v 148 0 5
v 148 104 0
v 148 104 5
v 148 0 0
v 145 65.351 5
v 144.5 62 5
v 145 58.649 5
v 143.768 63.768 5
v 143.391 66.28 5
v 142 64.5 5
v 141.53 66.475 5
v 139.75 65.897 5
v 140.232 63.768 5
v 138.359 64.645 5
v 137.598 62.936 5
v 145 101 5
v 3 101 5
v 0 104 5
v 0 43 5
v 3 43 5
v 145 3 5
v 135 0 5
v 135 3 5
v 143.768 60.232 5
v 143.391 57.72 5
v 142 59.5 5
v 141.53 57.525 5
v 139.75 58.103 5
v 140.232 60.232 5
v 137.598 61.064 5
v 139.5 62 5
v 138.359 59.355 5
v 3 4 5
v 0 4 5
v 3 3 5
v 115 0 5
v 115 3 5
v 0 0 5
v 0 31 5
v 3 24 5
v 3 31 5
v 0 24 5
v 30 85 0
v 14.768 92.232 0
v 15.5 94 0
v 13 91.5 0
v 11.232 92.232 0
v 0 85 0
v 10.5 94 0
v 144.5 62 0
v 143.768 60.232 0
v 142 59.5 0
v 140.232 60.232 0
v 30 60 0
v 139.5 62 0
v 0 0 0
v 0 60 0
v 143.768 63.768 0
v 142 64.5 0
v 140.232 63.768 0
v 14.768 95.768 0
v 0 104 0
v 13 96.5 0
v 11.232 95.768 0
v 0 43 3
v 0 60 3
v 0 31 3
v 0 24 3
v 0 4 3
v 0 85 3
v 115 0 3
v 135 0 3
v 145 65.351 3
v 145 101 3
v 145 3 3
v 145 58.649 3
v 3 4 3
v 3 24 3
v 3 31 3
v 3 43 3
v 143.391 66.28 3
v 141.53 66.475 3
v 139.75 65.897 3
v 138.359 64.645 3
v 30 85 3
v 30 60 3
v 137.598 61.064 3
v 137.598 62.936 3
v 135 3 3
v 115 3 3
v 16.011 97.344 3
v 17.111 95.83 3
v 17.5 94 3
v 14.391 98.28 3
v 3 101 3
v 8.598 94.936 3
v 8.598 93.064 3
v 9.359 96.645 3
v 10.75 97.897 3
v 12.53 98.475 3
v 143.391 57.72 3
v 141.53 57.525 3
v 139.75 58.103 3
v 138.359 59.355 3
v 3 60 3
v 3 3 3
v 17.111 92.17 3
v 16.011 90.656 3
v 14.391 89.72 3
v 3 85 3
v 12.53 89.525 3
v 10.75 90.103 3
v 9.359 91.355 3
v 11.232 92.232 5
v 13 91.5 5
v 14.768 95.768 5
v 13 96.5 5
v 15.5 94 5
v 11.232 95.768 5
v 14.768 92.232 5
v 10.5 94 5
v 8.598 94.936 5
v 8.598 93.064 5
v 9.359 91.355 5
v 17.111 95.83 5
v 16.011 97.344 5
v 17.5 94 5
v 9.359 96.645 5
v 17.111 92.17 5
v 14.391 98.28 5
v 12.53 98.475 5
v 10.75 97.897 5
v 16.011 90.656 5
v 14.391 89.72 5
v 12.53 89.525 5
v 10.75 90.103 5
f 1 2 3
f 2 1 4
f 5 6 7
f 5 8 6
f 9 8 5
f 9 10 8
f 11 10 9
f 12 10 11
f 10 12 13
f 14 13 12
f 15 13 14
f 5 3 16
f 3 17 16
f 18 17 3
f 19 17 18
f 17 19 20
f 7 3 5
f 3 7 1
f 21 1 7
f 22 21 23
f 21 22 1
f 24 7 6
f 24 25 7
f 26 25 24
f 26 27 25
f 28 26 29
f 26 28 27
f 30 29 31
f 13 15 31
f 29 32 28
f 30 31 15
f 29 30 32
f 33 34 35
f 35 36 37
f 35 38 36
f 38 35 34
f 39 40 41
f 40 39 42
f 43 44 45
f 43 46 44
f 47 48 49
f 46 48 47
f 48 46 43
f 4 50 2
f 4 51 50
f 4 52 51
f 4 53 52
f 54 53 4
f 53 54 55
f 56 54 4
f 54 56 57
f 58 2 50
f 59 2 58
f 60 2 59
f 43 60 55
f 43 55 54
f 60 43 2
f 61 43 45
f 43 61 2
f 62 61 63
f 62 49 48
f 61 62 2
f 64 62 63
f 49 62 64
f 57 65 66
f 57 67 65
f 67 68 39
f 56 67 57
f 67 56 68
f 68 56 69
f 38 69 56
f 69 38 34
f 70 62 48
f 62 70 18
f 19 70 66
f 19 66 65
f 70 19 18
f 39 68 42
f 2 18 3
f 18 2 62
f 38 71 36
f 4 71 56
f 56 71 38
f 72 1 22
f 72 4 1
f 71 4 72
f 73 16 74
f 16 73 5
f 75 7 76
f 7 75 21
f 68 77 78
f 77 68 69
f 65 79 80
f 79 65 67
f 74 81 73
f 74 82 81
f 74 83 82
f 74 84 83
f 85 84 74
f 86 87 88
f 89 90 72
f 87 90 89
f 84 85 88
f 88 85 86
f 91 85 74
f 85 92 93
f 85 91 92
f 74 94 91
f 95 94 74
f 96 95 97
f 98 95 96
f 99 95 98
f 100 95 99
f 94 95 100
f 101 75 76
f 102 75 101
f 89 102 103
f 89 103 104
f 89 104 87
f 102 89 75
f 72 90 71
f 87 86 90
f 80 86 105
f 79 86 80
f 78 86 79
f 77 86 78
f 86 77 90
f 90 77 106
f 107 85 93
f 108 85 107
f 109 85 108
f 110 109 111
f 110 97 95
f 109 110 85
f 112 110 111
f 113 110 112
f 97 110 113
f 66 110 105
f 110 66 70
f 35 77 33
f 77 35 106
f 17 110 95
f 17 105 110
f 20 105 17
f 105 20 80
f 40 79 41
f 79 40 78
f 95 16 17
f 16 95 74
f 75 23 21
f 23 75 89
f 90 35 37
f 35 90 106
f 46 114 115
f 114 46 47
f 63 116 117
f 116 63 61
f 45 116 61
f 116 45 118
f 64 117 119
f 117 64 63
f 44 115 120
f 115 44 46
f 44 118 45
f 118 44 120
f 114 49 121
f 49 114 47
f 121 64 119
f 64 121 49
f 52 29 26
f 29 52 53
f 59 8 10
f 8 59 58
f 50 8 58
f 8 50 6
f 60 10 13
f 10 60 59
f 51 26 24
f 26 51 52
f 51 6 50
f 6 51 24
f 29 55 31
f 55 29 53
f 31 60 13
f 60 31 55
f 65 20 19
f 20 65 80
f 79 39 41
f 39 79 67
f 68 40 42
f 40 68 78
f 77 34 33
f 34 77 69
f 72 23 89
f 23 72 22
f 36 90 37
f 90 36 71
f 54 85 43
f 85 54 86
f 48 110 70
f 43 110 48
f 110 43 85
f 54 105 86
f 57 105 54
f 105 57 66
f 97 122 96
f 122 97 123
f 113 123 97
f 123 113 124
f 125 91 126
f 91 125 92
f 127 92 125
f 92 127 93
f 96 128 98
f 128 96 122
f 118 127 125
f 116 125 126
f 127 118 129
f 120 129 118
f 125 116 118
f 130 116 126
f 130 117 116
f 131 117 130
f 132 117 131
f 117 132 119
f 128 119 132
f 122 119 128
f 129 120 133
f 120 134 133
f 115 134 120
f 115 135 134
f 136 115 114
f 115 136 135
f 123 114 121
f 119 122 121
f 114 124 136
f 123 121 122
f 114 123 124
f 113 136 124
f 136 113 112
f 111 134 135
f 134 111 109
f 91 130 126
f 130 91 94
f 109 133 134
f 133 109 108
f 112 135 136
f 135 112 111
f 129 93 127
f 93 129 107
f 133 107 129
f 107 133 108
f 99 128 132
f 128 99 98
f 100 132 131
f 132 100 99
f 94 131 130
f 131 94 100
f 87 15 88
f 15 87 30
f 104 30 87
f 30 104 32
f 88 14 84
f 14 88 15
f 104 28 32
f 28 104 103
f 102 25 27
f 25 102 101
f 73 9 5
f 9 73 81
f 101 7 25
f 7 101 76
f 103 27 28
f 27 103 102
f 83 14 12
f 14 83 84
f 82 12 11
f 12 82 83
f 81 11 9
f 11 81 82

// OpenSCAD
thickness = 3;

boardLength = 140;
boardLengthPadding = 1;

boardLengthTotal = boardLength + 2 * boardLengthPadding + 2 * thickness;

boardWidth = 75;
boardWidthPaddingLeft = 3;
boardWidthPaddingRight = 20;
boardWidthTotal = boardWidth + boardWidthPaddingLeft + boardWidthPaddingRight + 2 * thickness;

screwDiameter = 4;
screwDiameterPadding = 1;
screwBoardHeightPadding = 2;
screwBoardRadiusPadding = 2;
screwHoleRadius = (screwDiameter + screwDiameterPadding) / 2;

bottomLeftLength = 9;
bottomLeftWidth = 4;

topRightLength = 138;
topRightWidth = 36;

usbConnectorWidth = 61;
usbPlugWidth = 12;
usbPlugHeight = 12;

usbConnectorHoleWidth = usbConnectorWidth - (usbPlugWidth / 2);

bottomCabelInputPadding = 1;
bottomCabelInputWidth = 20;
bottomCabelInputHeight = 20;

rightCabelInputPadding = 10;
rightCabelInputWidth = 20;
rightCabelInputHeight = 20;

boarderThickness = 5;

cableHolderWidth = 25;
cableHolderHeight = 30;
cableHolderWidthOffset = 60;

cabHolderWidth = 10;
cabHolderHeight = 4;
cabHolderHeightOffset = 10;
cabHolderLegthOffsetFirst = boardWidthTotal / 4 - cabHolderWidth / 2;
cabHolderLegthOffsetSecond = 3 * boardWidthTotal / 4 - cabHolderWidth / 2;

echo(cabHolderLegthOffsetFirst, cabHolderLegthOffsetSecond);

difference() {
    cube([boardLengthTotal, boardWidthTotal, boarderThickness]);
    
    // Remove the inner block
    translate([thickness, thickness, thickness]) cube([boardLength + 2 * boardLengthPadding, boardWidth + boardWidthPaddingLeft + boardWidthPaddingRight, boarderThickness]);
    
    // Drill bottom left hole
    translate([thickness + boardLengthPadding + bottomLeftLength, thickness + boardWidth + boardWidthPaddingRight -  bottomLeftWidth, 0] ) cylinder(r=screwHoleRadius, thickness);
    
    // Drill bottom right hole
    translate([thickness + boardLengthPadding + topRightLength, thickness + boardWidth + boardWidthPaddingRight - topRightWidth, 0] ) cylinder(r=screwHoleRadius, thickness);
    
    // USB Connector
    translate([0, boardWidthTotal - thickness - boardWidthPaddingLeft - usbConnectorHoleWidth - usbPlugWidth, thickness]) cube([thickness, usbPlugWidth, usbPlugHeight]);
    
    // Bottom cabel input
    translate([0, thickness + bottomCabelInputPadding, thickness]) cube([thickness, bottomCabelInputWidth, bottomCabelInputHeight]);
       
    // Right cabel input
    translate([thickness + boardLength + 2 * boardLengthPadding - rightCabelInputPadding - rightCabelInputWidth, 0, thickness]) cube([rightCabelInputWidth, thickness, rightCabelInputHeight]);
    
    // CableHolder
    translate([0, cableHolderWidthOffset, 0]) cube([cableHolderHeight, cableHolderWidth, thickness]);
    
    // CabHolder Bottom
    translate([0, cabHolderLegthOffsetFirst, boarderThickness - cabHolderHeightOffset]) cube([thickness, cabHolderWidth, cabHolderHeight]);
    translate([0, cabHolderLegthOffsetSecond, boarderThickness - cabHolderHeightOffset]) cube([thickness, cabHolderWidth, cabHolderHeight]);
    
     // CabHolder Top
    translate([boardLengthTotal - thickness, cabHolderLegthOffsetFirst, boarderThickness - cabHolderHeightOffset]) cube([thickness, cabHolderWidth, cabHolderHeight]);
    translate([boardLengthTotal - thickness, cabHolderLegthOffsetSecond, boarderThickness - cabHolderHeightOffset]) cube([thickness, cabHolderWidth, cabHolderHeight]);
}

// Drill bottom left hole
difference() {
    translate([thickness + boardLengthPadding + bottomLeftLength, thickness + boardWidth + boardWidthPaddingRight -  bottomLeftWidth, 0] ) cylinder(r=screwHoleRadius + screwBoardRadiusPadding, thickness + screwBoardHeightPadding);
    translate([thickness + boardLengthPadding + bottomLeftLength, thickness + boardWidth + boardWidthPaddingRight -  bottomLeftWidth, 0] ) cylinder(r=screwHoleRadius, thickness + screwBoardHeightPadding);
}

// Drill bottom right hole
difference() {
    translate([thickness + boardLengthPadding + topRightLength, thickness + boardWidth + boardWidthPaddingRight - topRightWidth, 0] ) cylinder(r=screwHoleRadius + screwBoardRadiusPadding, thickness + screwBoardHeightPadding);
    translate([thickness + boardLengthPadding + topRightLength, thickness + boardWidth + boardWidthPaddingRight - topRightWidth, 0] ) cylinder(r=screwHoleRadius, thickness + screwBoardHeightPadding);
}
